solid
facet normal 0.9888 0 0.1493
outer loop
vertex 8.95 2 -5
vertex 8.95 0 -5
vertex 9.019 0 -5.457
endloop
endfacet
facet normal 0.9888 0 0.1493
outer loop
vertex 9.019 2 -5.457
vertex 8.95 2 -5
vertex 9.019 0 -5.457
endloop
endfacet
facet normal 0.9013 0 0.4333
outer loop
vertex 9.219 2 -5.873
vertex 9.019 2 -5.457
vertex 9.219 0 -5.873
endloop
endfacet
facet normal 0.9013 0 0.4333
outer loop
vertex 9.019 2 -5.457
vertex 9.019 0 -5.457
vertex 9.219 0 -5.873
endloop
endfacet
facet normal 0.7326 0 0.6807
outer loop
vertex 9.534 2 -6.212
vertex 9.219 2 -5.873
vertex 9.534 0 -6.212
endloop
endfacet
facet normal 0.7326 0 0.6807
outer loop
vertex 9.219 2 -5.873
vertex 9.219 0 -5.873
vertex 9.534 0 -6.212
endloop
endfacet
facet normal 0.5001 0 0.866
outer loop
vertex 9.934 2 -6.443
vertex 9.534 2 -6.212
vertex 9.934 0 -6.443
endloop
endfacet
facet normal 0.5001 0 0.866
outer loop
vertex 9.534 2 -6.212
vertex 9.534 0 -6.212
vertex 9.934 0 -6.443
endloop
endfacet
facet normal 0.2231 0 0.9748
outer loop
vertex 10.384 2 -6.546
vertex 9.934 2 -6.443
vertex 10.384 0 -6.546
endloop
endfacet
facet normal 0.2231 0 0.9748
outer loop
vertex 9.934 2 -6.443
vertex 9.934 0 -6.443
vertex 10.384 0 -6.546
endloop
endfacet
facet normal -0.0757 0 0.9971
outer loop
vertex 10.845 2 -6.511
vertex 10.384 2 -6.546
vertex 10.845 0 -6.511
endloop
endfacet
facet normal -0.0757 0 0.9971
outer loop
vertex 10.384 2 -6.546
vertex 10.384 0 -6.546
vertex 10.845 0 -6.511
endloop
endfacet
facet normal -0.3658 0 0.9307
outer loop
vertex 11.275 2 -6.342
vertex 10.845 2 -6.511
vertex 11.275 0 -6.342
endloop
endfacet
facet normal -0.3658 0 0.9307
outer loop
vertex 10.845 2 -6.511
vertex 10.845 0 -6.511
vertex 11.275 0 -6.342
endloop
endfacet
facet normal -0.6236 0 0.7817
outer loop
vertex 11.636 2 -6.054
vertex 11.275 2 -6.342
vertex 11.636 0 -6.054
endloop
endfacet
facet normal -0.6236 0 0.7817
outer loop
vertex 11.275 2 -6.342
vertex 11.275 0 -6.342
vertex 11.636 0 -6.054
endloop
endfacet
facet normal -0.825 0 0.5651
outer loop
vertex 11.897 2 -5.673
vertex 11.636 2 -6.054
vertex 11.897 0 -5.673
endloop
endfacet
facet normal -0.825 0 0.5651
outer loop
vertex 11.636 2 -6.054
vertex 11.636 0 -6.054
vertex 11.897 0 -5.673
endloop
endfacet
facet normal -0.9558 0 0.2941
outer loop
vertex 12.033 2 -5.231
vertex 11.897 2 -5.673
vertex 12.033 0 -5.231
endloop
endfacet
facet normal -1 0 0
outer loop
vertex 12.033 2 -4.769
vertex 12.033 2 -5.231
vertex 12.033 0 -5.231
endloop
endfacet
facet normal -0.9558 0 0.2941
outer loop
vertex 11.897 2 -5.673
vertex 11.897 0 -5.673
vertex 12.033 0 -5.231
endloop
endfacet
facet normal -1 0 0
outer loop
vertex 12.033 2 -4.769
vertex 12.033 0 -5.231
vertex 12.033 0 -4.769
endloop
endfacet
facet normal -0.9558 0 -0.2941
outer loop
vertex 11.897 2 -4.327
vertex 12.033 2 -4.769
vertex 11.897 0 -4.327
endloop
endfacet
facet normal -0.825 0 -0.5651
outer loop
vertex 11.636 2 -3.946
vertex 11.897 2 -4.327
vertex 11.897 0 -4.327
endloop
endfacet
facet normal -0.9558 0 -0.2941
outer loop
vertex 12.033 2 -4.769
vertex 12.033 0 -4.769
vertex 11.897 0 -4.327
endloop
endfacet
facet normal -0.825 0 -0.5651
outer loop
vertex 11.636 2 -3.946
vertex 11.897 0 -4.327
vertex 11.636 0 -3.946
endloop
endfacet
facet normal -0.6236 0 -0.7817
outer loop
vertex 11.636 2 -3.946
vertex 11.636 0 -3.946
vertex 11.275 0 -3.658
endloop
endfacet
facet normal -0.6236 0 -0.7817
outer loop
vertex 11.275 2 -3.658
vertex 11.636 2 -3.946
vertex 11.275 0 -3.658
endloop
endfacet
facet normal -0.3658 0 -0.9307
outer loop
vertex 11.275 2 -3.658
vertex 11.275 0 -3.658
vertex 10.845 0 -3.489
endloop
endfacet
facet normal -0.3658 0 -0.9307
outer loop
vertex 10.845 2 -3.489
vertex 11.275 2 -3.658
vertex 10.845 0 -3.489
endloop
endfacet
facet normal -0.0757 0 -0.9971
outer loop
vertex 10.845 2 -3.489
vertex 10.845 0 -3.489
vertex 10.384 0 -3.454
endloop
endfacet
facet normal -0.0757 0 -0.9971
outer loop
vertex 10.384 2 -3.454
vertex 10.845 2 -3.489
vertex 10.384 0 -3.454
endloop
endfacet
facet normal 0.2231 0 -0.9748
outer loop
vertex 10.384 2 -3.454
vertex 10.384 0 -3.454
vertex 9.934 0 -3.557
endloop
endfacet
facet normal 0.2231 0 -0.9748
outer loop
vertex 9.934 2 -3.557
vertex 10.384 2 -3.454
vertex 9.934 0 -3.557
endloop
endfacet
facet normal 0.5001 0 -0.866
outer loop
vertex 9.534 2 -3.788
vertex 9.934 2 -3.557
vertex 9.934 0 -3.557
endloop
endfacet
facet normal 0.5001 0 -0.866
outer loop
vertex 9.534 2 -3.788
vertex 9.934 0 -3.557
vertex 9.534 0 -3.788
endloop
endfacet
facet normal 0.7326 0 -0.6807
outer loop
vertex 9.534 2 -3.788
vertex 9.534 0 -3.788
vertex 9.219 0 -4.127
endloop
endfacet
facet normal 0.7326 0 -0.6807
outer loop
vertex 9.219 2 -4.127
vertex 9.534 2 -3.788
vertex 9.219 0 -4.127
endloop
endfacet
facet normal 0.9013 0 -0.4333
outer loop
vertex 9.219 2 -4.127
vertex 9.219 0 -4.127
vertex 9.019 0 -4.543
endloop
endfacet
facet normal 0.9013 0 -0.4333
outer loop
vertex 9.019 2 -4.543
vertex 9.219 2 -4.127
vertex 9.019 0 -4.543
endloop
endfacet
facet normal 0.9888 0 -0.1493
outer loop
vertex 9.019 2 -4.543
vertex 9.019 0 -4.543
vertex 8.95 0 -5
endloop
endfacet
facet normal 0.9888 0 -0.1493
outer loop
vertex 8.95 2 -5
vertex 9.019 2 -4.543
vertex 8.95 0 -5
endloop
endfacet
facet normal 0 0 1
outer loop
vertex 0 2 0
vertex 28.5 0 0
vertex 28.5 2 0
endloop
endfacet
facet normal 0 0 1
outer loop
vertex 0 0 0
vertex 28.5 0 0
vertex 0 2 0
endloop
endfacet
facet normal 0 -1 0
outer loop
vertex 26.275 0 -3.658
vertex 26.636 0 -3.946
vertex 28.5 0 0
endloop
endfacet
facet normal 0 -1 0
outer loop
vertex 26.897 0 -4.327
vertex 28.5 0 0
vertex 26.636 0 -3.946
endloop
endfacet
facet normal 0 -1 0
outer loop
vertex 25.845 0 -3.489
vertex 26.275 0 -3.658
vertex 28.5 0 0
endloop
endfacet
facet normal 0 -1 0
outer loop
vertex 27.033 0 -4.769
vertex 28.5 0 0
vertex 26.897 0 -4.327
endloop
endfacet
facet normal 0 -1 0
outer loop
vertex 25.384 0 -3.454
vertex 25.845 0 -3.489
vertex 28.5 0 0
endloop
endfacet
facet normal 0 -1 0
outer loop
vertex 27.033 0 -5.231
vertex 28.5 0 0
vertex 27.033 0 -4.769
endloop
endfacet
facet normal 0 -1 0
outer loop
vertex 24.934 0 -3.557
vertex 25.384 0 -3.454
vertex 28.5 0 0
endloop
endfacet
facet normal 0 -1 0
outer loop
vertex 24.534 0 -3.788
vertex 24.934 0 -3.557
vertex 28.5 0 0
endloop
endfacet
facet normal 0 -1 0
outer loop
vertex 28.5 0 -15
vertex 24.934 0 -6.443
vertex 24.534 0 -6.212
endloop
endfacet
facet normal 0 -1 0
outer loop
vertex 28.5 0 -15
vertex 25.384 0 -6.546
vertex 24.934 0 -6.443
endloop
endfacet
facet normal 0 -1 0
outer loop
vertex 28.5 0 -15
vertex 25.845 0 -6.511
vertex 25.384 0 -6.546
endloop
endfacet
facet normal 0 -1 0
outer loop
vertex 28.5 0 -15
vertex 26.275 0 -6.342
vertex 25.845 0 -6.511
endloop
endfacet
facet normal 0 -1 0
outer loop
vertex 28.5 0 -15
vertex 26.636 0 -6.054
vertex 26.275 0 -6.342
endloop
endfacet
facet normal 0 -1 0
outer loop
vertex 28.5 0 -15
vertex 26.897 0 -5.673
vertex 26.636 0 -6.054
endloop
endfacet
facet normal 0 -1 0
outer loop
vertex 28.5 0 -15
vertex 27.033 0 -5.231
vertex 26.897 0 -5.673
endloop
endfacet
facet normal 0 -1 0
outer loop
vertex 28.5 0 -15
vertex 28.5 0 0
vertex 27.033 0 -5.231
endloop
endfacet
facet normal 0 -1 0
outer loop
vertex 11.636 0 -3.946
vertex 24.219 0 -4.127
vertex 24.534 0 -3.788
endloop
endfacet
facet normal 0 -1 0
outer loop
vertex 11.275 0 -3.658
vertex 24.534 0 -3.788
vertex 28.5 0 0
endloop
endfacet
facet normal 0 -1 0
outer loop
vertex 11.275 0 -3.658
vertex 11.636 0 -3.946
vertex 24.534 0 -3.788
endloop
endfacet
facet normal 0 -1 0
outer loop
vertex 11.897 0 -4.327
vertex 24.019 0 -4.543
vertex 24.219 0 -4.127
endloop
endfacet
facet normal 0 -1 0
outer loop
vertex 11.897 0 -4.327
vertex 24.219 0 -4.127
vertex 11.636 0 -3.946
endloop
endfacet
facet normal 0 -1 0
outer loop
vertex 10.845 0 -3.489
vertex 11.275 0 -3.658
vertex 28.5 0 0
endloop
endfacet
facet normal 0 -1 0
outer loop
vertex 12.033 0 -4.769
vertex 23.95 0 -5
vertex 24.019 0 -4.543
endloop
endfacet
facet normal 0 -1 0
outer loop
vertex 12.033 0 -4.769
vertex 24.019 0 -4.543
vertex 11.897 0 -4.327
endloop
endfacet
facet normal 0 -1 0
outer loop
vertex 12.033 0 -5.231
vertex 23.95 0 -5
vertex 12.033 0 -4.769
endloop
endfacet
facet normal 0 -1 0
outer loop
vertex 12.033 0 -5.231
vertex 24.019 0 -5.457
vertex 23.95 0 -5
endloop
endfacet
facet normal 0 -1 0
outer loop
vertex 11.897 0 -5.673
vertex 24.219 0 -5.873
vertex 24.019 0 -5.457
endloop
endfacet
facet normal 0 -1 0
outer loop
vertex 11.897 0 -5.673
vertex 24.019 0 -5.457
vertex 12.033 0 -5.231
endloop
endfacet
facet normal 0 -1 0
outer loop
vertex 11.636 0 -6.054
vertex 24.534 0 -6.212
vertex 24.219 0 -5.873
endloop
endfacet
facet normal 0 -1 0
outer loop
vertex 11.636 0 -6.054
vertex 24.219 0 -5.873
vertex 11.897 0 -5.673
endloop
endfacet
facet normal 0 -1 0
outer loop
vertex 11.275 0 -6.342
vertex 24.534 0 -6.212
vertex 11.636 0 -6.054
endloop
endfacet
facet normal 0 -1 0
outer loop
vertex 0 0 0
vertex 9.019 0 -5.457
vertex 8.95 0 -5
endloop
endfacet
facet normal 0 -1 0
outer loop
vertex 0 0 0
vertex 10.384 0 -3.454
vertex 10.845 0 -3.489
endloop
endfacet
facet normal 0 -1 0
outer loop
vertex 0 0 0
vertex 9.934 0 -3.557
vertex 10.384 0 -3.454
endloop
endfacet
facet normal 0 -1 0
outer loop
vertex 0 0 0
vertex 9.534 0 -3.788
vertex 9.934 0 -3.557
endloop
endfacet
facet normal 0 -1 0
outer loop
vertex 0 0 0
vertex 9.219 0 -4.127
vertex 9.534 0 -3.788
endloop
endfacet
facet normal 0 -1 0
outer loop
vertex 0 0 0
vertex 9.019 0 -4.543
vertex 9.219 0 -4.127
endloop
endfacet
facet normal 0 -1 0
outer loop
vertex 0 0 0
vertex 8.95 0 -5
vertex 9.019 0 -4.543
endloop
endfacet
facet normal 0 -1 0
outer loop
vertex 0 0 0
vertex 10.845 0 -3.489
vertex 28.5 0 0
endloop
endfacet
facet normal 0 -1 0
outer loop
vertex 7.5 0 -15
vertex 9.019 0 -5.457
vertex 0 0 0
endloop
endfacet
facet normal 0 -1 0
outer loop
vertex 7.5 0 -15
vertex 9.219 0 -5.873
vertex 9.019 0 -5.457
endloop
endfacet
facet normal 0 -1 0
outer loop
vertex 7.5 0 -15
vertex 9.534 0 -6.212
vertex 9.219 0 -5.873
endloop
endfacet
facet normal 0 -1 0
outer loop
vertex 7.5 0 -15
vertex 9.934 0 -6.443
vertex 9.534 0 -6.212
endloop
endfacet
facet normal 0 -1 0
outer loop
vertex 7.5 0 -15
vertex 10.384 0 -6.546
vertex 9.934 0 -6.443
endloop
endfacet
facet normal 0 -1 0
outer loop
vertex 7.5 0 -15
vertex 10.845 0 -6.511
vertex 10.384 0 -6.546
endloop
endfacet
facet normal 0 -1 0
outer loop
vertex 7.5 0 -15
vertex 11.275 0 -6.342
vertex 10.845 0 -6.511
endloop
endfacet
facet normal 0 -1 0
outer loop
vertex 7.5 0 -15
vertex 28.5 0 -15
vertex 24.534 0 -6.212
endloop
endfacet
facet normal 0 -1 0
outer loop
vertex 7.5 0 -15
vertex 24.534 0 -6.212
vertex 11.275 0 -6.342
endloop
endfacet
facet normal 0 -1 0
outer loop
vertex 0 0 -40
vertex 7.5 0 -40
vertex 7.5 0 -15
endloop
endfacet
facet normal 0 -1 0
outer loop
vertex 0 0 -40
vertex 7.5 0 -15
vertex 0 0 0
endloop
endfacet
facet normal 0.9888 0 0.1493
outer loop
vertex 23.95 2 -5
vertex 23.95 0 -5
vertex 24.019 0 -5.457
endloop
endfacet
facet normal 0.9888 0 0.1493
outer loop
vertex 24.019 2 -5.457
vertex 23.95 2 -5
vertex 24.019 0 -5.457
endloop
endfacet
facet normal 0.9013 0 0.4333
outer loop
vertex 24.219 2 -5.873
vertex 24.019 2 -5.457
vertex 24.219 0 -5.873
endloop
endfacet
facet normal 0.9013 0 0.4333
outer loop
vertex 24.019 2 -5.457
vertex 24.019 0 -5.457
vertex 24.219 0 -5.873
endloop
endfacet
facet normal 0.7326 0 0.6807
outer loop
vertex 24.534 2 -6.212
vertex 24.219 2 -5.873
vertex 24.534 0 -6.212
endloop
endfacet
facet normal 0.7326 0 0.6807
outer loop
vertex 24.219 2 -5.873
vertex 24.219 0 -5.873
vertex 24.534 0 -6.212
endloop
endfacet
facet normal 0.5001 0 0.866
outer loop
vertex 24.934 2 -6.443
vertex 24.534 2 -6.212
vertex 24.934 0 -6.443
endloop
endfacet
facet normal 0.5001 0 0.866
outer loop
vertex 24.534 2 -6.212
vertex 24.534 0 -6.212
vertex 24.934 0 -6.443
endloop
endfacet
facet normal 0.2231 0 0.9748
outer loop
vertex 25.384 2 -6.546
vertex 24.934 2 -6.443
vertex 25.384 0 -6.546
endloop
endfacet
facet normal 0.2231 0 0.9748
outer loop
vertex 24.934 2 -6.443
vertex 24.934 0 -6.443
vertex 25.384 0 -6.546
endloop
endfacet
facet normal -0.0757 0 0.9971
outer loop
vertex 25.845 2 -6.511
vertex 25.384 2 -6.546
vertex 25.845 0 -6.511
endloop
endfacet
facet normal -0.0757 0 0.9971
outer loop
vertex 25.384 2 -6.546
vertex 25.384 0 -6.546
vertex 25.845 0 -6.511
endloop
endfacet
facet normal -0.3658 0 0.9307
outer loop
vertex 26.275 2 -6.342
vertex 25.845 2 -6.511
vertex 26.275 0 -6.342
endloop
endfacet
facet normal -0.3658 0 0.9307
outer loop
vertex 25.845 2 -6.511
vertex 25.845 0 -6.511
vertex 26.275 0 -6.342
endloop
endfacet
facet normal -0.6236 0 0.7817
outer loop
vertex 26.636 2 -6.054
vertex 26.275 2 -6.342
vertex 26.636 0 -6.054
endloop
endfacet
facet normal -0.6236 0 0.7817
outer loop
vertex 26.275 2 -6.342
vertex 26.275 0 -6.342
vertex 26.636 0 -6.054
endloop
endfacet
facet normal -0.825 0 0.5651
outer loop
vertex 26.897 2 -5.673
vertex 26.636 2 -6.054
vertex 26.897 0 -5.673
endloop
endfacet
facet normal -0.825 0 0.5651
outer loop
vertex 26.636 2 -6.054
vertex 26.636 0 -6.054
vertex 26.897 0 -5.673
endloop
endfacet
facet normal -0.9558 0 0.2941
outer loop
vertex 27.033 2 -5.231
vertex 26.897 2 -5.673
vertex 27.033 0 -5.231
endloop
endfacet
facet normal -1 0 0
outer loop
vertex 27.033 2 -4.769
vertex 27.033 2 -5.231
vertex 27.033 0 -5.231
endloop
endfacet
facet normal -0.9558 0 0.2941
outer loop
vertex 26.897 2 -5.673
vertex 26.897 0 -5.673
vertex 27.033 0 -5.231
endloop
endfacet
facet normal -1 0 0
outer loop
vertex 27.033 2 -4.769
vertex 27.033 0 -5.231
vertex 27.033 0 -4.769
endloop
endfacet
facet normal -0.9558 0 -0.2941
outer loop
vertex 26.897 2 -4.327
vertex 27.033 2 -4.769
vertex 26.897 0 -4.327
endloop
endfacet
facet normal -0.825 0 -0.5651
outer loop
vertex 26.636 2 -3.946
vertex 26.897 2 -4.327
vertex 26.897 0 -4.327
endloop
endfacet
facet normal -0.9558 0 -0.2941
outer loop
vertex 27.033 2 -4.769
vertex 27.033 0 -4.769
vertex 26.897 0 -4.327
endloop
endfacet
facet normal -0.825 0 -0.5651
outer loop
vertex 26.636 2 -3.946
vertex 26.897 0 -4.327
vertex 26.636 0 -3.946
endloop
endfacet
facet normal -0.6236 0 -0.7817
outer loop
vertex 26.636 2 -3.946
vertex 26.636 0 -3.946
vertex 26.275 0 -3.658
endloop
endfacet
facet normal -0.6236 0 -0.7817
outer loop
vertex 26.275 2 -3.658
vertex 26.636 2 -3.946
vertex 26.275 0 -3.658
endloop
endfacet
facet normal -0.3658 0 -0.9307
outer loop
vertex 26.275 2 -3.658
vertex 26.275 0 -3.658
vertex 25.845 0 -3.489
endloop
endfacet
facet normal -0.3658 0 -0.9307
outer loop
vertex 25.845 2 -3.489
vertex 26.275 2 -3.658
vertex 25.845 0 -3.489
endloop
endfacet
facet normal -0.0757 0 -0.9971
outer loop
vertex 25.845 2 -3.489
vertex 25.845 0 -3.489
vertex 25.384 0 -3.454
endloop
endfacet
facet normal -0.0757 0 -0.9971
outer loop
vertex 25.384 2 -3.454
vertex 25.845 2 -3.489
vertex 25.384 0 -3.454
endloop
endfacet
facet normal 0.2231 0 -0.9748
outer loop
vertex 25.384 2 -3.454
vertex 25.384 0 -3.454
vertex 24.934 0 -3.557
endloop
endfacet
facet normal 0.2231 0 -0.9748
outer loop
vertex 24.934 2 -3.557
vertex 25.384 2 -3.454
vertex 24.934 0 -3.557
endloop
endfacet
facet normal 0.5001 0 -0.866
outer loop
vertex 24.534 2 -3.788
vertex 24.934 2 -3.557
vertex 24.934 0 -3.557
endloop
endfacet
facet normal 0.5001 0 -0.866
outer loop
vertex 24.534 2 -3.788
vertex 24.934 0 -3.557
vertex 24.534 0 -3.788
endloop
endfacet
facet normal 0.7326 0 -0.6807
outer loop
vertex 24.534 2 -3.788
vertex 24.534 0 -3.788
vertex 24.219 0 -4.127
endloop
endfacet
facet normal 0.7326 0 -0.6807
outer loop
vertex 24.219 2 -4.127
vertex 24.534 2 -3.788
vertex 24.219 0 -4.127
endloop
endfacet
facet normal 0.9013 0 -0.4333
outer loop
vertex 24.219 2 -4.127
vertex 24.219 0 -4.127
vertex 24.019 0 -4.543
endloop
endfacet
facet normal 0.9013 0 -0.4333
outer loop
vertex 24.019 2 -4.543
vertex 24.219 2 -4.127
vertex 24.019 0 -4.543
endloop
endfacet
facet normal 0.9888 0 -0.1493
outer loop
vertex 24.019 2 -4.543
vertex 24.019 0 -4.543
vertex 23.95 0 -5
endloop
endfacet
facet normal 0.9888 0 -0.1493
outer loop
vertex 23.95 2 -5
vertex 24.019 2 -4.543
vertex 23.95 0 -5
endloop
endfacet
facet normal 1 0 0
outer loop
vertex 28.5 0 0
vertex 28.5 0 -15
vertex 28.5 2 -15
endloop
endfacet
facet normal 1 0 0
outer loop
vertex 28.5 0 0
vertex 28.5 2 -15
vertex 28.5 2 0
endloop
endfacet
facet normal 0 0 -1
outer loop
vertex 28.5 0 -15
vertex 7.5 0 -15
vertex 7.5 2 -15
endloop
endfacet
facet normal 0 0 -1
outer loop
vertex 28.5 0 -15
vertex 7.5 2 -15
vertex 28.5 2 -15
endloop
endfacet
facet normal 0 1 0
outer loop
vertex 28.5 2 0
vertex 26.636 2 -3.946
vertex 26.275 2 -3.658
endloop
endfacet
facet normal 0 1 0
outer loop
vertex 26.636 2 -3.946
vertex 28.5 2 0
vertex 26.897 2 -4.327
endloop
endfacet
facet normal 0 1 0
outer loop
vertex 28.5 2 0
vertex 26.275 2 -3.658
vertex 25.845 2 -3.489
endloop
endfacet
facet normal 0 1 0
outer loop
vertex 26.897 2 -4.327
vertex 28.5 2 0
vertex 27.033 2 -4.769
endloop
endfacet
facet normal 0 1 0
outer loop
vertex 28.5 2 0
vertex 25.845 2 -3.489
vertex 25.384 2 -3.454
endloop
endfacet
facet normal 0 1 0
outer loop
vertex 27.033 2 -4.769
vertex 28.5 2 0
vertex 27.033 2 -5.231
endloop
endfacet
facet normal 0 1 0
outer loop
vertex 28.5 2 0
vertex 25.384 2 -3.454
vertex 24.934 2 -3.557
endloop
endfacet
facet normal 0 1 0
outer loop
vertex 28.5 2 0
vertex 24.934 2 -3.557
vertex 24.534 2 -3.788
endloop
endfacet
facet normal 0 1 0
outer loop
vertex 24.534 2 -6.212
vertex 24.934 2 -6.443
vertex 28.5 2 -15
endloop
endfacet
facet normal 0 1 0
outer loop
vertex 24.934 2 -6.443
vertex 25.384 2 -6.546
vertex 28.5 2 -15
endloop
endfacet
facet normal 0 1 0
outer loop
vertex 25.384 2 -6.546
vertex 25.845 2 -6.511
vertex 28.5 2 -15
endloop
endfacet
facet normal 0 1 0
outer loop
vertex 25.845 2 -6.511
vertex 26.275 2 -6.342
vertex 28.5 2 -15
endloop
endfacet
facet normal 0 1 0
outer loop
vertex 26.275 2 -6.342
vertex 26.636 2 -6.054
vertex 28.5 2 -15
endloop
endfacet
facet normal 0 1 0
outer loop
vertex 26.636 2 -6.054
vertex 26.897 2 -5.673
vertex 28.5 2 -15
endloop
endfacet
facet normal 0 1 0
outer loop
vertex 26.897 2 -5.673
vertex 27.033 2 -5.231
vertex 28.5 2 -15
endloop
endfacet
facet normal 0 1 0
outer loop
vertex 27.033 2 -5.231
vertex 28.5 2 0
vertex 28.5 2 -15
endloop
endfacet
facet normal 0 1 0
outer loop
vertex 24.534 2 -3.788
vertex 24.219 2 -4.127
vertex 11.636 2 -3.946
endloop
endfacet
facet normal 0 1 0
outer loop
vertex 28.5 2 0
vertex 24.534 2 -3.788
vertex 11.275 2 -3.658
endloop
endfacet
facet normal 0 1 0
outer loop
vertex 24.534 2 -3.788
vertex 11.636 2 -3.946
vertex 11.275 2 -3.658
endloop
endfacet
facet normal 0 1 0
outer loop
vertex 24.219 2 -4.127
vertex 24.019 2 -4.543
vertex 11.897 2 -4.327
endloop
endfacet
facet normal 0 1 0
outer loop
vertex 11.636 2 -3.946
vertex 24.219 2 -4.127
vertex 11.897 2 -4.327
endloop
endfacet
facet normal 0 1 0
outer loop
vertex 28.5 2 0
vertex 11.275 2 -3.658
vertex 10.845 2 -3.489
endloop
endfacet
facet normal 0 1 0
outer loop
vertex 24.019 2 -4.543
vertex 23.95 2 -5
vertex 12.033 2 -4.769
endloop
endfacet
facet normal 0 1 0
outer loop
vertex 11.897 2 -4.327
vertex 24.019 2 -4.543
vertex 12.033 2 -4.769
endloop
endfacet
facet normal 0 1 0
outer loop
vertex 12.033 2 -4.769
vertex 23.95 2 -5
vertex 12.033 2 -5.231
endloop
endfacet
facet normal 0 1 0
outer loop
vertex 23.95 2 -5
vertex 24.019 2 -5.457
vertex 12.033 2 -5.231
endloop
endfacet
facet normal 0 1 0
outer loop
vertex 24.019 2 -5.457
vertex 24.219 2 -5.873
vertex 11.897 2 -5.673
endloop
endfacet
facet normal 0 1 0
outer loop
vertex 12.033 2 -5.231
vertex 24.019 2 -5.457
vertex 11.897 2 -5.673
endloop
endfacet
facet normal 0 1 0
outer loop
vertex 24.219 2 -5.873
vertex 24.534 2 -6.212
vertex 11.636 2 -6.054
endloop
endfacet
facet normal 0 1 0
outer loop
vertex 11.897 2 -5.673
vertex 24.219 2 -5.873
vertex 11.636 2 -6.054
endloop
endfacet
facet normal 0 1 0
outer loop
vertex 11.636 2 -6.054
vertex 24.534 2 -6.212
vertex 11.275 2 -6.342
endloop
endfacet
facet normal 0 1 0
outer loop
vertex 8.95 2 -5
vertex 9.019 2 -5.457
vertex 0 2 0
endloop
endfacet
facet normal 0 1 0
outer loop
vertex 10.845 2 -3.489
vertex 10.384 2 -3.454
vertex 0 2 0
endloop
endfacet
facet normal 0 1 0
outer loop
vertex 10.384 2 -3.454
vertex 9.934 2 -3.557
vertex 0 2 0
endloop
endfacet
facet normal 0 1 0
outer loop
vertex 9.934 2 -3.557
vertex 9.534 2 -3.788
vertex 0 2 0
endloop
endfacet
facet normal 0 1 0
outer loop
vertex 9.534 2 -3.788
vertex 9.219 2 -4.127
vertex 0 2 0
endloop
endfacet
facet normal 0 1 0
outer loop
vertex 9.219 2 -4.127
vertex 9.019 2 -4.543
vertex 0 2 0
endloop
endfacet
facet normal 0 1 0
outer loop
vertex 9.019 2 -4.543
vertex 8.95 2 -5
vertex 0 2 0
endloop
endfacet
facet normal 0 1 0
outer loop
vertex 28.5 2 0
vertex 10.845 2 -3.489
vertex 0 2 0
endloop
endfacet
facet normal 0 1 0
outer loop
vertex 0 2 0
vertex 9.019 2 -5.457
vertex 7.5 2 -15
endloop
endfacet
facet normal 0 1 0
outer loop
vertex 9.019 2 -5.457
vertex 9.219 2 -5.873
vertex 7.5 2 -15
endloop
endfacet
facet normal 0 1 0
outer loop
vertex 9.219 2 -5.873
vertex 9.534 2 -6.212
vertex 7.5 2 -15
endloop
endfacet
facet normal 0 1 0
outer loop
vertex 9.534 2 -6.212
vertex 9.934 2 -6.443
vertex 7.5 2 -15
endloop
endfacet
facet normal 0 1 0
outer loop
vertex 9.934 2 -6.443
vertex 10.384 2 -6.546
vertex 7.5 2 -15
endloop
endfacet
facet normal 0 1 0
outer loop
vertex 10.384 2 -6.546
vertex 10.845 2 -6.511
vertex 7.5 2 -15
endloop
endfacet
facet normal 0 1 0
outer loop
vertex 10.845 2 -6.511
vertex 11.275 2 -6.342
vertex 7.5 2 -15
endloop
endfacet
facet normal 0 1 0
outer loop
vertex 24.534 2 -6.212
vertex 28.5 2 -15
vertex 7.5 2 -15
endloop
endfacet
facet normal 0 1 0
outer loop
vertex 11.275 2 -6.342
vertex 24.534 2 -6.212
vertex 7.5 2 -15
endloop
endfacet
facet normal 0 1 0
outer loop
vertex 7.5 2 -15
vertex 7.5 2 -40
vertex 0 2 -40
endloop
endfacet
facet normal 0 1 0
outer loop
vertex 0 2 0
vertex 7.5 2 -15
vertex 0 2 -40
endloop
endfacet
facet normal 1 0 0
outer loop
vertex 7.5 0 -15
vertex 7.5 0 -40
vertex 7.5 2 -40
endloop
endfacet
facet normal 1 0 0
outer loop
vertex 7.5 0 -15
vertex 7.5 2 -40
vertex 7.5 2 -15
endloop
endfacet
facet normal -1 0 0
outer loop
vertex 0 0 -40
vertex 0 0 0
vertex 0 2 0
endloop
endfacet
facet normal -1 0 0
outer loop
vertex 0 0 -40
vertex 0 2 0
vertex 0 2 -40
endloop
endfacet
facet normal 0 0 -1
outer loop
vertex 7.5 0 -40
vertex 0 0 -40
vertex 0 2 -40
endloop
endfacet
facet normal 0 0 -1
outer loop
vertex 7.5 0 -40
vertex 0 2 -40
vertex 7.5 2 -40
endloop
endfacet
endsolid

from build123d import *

# Parameters (mm, degrees)
BOSS_EXTRUDE1_DEPTH            = 2
F_3_1_3_1_DIAMETER_HOLE1_D     = 3.1
F_3_1_3_1_DIAMETER_HOLE1_DEPTH = 10
F_3_1_3_1_DIAMETER_HOLE1_TIP   = 0.931333959


with BuildPart() as part:
    # Sketch1 → Boss-Extrude1 (new body)
    with BuildSketch(Plane(origin=(0, 0, 0), x_dir=(1, 0, 0), z_dir=(0, 1, 0))):
        Polygon((0, 0), (0, 40), (7.5, 40), (7.5, 15), (28.5, 15), (28.5, 0), align=None)
    extrude(amount=BOSS_EXTRUDE1_DEPTH)

    # Ø3.1 (3.1) Diameter Hole1
    with Locations(Plane(origin=(0, 2, 0), x_dir=(1, 0, 0), z_dir=(0, 1, 0))):
        with Locations((10.5, 5), (25.5, 5)):
            Hole(F_3_1_3_1_DIAMETER_HOLE1_D / 2, depth=F_3_1_3_1_DIAMETER_HOLE1_DEPTH)
            with Locations((0, 0, -(F_3_1_3_1_DIAMETER_HOLE1_DEPTH + F_3_1_3_1_DIAMETER_HOLE1_TIP / 2))):  # 118° drill point
                Cone(0, F_3_1_3_1_DIAMETER_HOLE1_D / 2, F_3_1_3_1_DIAMETER_HOLE1_TIP, mode=Mode.SUBTRACT)


solid = part.part
